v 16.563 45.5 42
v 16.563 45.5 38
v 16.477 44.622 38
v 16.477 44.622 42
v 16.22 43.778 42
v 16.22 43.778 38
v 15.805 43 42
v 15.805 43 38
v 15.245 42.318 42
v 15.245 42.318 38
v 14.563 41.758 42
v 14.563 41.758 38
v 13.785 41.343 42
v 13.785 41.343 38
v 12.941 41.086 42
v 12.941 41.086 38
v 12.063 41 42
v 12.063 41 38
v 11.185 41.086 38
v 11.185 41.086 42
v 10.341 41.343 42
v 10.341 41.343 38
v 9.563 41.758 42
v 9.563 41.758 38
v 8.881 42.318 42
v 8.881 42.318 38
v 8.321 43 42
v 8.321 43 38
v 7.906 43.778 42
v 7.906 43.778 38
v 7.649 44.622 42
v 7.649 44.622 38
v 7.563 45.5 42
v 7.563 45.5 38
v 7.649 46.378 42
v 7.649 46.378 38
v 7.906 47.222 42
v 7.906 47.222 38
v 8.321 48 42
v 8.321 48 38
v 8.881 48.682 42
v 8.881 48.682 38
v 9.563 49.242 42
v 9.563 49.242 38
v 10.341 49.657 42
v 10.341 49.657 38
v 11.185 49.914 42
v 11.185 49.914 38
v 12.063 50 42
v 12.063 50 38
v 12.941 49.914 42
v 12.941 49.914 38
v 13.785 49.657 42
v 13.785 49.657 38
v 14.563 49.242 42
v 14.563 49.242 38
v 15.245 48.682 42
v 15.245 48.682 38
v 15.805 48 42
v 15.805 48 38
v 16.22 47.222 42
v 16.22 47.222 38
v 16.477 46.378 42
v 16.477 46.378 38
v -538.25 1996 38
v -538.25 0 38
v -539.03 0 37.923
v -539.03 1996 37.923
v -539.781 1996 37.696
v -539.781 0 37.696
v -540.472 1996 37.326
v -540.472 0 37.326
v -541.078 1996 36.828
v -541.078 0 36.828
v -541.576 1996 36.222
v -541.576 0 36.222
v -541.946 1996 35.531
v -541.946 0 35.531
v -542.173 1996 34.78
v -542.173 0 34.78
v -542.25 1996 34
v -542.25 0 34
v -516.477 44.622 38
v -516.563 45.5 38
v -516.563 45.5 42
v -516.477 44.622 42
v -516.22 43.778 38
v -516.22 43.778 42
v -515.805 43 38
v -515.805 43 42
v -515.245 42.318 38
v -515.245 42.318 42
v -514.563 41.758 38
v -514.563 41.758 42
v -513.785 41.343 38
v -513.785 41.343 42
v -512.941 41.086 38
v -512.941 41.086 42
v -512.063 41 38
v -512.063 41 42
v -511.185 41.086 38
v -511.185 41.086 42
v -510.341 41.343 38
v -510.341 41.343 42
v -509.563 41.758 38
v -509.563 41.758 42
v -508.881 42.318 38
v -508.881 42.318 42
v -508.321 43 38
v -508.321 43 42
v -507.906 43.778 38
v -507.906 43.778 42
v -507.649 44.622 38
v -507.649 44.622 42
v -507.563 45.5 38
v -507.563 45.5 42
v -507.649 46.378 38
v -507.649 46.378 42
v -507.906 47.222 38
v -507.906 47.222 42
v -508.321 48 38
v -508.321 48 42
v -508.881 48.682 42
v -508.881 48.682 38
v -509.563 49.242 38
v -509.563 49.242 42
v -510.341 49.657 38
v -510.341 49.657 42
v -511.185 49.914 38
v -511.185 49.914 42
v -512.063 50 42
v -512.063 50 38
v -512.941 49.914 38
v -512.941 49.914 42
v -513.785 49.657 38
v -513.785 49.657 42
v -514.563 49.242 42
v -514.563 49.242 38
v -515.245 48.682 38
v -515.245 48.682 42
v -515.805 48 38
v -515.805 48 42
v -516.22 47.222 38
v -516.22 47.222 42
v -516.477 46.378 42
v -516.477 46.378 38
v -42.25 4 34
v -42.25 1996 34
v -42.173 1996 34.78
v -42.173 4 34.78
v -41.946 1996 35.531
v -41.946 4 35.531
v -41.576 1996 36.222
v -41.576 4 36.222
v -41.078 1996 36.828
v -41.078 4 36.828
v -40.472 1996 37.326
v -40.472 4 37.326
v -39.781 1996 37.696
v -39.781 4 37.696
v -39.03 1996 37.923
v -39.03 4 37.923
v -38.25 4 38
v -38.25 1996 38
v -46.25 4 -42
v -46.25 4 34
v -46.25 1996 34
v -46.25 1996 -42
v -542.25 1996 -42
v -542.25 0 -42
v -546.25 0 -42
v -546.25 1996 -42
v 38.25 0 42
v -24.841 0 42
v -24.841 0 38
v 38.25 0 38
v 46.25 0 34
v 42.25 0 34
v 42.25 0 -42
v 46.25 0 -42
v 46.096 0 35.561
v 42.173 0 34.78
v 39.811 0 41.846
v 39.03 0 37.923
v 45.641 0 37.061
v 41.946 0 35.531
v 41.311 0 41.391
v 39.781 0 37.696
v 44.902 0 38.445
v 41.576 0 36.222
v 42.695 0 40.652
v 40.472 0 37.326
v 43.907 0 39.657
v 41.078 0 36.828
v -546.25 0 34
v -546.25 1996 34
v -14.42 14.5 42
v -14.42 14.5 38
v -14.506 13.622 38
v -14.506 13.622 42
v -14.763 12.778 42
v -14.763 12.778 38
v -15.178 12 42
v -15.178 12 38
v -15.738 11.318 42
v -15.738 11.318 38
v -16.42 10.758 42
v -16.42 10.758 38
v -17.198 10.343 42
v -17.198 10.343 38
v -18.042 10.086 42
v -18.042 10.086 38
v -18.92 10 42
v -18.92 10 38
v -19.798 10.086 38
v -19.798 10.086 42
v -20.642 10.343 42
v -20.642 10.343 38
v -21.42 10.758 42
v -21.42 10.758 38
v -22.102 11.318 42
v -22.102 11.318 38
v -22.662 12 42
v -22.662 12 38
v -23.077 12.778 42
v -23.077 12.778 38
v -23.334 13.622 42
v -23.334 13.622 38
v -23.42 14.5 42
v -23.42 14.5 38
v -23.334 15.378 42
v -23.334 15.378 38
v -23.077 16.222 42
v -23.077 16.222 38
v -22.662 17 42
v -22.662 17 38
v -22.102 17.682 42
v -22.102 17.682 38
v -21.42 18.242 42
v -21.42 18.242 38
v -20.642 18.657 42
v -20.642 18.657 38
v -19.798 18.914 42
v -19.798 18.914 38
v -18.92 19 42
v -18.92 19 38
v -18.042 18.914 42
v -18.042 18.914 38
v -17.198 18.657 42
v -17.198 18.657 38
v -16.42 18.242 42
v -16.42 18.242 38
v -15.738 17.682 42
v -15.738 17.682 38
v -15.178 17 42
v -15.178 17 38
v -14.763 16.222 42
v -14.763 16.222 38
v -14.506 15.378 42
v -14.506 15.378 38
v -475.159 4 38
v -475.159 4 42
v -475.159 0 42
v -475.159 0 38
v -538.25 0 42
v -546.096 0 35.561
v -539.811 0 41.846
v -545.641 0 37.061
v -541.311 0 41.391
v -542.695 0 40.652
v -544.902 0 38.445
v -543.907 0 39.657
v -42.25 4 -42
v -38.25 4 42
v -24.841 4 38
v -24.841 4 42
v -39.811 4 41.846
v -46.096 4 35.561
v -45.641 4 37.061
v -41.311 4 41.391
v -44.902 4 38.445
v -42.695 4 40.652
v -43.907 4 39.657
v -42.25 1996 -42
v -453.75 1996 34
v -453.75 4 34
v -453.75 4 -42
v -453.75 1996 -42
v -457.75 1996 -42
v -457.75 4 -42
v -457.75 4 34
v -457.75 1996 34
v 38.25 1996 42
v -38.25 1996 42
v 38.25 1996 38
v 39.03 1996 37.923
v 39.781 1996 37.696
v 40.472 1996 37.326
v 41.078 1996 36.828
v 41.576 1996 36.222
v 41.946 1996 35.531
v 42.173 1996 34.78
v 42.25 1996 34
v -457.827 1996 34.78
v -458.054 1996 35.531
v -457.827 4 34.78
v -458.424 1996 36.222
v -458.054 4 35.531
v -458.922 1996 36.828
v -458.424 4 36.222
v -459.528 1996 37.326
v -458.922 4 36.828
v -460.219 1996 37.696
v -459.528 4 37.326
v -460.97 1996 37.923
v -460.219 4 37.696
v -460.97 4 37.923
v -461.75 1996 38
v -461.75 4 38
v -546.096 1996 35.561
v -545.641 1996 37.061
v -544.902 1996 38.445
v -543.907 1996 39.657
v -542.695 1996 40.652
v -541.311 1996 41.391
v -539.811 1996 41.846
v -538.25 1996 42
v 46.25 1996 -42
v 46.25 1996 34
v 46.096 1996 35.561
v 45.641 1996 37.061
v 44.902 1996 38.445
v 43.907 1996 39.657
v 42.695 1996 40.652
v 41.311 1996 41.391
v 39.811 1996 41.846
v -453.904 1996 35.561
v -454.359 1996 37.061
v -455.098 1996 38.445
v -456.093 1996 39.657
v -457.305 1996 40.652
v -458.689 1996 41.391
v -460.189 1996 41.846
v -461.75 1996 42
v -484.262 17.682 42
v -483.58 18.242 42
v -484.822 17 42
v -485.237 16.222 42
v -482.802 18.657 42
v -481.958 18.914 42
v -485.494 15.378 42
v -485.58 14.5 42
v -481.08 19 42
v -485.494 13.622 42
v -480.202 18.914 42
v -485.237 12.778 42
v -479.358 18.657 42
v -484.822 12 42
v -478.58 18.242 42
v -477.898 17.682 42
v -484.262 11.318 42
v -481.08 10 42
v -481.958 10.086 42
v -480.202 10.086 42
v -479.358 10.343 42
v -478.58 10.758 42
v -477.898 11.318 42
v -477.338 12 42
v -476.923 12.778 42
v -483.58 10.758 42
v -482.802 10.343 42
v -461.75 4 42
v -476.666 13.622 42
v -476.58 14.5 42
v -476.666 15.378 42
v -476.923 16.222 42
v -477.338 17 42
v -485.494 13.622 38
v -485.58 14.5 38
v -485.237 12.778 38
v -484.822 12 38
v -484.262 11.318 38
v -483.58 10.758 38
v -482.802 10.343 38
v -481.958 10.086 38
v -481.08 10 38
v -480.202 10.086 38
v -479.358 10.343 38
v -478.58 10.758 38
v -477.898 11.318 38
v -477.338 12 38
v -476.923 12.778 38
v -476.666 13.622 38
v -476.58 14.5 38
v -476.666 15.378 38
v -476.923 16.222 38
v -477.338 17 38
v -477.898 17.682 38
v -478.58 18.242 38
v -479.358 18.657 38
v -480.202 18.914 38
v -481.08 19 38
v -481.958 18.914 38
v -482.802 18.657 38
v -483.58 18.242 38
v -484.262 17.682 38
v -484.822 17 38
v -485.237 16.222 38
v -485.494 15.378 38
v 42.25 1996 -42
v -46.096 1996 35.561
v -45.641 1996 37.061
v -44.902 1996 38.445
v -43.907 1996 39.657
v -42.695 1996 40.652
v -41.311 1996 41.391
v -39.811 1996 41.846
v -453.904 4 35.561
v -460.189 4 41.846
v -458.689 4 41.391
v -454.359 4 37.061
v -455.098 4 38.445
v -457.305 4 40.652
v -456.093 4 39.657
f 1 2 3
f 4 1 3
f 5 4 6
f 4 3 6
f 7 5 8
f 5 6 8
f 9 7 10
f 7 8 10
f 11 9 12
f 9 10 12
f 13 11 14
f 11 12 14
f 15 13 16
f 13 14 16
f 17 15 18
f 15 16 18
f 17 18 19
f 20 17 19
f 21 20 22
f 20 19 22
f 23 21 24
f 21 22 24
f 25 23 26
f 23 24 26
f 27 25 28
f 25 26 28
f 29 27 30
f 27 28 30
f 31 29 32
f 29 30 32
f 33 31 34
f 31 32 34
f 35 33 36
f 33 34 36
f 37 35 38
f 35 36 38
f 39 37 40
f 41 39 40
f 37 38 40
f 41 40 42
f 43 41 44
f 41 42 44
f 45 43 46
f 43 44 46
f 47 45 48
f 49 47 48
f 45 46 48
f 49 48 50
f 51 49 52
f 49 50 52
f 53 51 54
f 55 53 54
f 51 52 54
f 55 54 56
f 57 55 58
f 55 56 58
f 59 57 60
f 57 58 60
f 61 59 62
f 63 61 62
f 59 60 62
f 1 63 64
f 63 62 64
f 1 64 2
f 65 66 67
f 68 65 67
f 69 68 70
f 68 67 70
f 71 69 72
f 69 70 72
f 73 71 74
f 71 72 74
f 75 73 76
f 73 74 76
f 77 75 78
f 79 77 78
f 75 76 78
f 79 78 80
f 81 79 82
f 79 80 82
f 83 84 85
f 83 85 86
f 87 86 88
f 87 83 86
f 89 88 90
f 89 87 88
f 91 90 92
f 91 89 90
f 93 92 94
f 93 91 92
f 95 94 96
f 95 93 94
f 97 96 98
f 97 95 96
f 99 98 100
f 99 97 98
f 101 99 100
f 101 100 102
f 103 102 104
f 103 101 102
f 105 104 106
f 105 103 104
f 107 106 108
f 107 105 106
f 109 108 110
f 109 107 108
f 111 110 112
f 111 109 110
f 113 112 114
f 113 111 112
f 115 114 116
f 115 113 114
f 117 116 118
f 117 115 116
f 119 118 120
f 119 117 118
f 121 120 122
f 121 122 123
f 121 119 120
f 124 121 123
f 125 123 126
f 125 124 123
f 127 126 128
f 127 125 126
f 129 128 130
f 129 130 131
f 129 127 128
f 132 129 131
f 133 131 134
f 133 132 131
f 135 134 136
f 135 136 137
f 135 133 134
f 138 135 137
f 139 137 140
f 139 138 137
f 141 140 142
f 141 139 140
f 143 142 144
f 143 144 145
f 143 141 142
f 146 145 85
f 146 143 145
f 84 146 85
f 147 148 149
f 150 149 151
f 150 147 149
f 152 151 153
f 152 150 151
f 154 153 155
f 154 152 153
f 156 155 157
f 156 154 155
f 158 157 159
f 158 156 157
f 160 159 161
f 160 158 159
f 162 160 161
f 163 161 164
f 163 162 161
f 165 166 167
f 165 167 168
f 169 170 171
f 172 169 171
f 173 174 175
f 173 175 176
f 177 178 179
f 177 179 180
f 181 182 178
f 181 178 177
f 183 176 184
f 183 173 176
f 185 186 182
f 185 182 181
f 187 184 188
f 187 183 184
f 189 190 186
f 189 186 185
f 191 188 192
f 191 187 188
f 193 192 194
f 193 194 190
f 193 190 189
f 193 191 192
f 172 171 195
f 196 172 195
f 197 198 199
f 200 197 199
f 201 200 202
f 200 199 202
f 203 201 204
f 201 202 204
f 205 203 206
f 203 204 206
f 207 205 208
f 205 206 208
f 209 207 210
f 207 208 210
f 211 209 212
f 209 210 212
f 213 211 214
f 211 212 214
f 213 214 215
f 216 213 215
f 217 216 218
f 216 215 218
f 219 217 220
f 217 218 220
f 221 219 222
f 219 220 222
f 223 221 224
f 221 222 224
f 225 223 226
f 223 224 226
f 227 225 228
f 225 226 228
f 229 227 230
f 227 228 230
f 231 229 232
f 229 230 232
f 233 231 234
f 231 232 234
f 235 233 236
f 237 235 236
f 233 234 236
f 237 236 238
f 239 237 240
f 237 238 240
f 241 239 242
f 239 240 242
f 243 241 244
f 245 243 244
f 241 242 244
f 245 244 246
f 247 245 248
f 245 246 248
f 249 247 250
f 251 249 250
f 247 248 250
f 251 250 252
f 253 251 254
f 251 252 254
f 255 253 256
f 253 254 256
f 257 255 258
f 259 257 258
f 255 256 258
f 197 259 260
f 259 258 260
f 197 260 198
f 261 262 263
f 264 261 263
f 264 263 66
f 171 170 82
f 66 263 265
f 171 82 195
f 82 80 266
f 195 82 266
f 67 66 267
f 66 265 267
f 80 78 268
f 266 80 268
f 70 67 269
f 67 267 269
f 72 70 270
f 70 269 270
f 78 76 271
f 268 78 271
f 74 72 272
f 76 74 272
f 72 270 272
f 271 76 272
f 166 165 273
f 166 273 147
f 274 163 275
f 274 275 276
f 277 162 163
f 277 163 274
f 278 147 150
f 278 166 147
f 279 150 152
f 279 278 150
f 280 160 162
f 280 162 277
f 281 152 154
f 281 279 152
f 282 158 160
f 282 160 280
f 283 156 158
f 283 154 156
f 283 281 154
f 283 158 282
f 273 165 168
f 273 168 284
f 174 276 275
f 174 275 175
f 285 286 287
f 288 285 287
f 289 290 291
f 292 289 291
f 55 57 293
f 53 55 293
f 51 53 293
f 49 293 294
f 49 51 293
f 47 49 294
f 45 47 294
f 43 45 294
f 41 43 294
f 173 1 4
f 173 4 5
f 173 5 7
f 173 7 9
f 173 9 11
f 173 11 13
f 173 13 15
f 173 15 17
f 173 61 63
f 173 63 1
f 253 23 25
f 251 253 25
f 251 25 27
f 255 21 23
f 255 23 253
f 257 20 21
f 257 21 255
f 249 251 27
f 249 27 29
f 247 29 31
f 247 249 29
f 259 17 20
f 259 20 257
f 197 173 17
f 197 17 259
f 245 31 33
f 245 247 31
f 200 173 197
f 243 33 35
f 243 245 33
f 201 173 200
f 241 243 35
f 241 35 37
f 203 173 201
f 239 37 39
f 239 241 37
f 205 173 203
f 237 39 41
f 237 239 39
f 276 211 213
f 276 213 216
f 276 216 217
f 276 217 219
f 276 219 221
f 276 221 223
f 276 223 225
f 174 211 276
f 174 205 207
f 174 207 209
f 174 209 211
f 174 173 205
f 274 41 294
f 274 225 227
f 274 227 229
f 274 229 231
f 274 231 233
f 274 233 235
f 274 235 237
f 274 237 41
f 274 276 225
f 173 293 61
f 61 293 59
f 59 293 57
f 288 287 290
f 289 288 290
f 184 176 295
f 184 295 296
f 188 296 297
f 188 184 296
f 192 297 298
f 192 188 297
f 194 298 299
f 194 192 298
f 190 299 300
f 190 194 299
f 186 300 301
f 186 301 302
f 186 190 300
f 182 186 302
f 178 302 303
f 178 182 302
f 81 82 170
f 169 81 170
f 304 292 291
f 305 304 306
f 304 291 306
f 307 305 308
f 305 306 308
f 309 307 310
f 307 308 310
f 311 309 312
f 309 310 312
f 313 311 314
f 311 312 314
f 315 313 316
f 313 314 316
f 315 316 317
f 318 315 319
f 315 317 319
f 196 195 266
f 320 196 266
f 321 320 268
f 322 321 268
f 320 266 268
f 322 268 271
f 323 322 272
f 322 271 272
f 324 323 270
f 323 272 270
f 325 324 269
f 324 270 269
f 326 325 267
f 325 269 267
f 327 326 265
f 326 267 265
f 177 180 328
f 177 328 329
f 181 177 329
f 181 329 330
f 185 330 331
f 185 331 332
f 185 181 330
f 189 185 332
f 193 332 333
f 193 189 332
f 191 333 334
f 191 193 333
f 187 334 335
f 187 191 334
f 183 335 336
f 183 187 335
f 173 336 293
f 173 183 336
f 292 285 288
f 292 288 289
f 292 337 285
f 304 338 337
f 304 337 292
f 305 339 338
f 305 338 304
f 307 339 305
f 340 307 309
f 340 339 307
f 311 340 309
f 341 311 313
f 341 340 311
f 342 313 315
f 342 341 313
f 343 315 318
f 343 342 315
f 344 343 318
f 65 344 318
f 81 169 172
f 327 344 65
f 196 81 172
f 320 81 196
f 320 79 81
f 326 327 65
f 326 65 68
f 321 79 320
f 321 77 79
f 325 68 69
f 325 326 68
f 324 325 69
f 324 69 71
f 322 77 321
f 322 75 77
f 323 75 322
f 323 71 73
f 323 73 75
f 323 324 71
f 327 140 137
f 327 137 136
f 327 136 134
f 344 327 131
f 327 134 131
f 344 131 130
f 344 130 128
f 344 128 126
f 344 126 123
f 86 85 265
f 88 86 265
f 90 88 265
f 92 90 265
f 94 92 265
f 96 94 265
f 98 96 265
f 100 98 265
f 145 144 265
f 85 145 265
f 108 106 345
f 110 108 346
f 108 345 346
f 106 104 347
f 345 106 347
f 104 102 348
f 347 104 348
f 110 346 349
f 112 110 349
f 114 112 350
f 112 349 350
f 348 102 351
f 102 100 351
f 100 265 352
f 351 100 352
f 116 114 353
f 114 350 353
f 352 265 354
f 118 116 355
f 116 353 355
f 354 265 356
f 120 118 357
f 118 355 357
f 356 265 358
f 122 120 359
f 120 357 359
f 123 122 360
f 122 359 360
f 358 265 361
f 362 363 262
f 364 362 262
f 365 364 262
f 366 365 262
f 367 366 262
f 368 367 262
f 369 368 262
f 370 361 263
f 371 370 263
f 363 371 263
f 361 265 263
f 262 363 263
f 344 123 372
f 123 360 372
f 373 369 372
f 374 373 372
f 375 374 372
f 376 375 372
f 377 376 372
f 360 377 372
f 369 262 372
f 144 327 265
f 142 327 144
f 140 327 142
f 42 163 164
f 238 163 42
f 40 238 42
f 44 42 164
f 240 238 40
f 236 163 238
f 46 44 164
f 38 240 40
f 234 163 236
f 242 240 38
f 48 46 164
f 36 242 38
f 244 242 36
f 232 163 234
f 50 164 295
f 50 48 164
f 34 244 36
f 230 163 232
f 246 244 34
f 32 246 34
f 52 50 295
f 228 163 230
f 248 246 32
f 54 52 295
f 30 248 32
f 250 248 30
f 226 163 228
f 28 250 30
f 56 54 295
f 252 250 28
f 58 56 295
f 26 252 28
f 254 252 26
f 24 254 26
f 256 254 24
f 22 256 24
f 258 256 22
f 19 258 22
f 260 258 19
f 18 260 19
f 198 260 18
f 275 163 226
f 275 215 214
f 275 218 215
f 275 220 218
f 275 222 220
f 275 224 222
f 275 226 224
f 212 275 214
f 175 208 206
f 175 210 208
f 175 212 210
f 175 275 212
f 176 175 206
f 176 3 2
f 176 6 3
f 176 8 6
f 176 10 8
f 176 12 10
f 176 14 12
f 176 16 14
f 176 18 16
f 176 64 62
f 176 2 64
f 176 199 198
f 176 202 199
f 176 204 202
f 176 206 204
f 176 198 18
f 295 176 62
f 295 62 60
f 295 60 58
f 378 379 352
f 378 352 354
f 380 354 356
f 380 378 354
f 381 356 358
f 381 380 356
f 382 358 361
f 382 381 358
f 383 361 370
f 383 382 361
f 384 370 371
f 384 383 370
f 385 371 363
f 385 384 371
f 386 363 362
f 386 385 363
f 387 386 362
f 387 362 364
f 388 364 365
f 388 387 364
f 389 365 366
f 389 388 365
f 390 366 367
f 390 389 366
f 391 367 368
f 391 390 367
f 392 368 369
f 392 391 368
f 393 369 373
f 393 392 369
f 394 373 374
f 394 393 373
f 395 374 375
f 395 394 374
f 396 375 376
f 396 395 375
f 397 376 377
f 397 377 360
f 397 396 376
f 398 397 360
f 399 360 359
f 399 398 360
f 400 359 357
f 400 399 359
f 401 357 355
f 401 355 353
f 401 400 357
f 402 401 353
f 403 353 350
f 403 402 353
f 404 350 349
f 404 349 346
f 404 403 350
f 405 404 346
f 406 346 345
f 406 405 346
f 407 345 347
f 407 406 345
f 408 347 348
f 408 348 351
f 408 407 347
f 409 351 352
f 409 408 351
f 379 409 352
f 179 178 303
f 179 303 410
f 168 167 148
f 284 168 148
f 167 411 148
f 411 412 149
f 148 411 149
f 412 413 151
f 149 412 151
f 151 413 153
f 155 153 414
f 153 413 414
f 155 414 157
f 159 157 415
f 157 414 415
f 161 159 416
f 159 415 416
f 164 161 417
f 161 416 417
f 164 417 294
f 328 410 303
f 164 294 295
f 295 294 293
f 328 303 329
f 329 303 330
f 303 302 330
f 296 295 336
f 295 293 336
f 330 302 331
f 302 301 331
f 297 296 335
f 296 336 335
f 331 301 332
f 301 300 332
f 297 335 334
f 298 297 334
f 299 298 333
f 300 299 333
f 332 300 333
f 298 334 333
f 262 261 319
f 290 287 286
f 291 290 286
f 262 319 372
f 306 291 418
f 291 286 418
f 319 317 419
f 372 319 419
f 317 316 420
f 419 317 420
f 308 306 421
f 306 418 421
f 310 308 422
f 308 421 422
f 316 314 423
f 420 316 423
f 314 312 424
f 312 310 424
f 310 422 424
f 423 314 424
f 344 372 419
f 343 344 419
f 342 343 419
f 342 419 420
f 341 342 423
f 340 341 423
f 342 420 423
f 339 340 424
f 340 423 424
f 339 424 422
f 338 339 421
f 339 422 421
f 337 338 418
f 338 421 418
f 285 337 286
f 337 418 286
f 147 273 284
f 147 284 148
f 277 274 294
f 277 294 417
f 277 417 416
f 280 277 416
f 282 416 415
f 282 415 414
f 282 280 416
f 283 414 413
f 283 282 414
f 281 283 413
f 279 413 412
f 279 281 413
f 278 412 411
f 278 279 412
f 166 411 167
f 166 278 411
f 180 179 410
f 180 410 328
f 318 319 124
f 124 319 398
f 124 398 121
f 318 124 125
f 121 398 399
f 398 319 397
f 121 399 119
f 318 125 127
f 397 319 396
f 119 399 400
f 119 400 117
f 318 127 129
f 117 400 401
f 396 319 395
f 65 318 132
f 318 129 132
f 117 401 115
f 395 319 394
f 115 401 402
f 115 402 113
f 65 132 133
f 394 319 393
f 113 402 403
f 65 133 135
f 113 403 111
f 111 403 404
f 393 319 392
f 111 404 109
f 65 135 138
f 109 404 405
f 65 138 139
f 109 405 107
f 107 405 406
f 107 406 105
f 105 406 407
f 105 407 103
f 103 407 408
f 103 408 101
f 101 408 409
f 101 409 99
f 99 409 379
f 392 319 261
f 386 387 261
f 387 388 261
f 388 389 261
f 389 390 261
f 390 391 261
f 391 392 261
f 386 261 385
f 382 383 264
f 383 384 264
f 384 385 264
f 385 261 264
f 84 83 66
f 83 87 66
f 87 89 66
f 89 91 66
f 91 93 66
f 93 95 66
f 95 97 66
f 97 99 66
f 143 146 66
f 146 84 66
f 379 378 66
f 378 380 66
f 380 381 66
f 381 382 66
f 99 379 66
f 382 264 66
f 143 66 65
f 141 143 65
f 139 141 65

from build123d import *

# Parameters (mm, degrees)
F1_DEPTH = 1996
F3_W     = 4
F3_H     = 87
F4_DEPTH = 21.409
F6_R     = 4.5
F5_R     = 4.5
F7_DEPTH = 4


with BuildPart() as f1:
    # F0 (on Front) → F1 (new body)
    with BuildSketch(Plane.XZ):
        with BuildLine():
            Line((-46.25, 34), (-46.25, -42))
            Line((-46.25, -42), (-42.25, -42))
            Line((-42.25, -42), (-42.25, 34))
            ThreePointArc((-42.25, 34), (-41.078427, 36.828427), (-38.25, 38))
            Line((-38.25, 38), (38.25, 38))
            ThreePointArc((38.25, 38), (41.078427, 36.828427), (42.25, 34))
            Line((42.25, 34), (42.25, -42))
            Line((42.25, -42), (46.25, -42))
            Line((46.25, -42), (46.25, 34))
            ThreePointArc((46.25, 34), (43.906854, 39.656854), (38.25, 42))
            Line((38.25, 42), (-38.25, 42))
            ThreePointArc((-38.25, 42), (-43.906854, 39.656854), (-46.25, 34))
        make_face()
    extrude(amount=-F1_DEPTH)

    # F3 (on face) → F4 (cut)
    with BuildSketch(Plane(origin=(-46.25, 0, 0), x_dir=(0, -1, 0), z_dir=(-1, 0, 0))):
        with Locations((-2, 0.370724)):
            Rectangle(F3_W, F3_H)
    extrude(amount=-F4_DEPTH, mode=Mode.SUBTRACT)

    # F6 (on face) + F5 (on face) → F7 (cut)
    with BuildSketch(Plane(origin=(0, 0, 38), x_dir=(1, 0, 0), z_dir=(0, 0, -1))):
        with Locations((12.063, -45.5)):
            Circle(F6_R)
    with BuildSketch(Plane(origin=(0, 0, 38), x_dir=(1, 0, 0), z_dir=(0, 0, -1))):
        with Locations((-18.92, -14.5)):
            Circle(F5_R)
    extrude(amount=-F7_DEPTH, mode=Mode.SUBTRACT)


with BuildPart() as f9_1:
    # F9: instance of F1
    add(f1.part.mirror(Plane.YZ.offset(-250)))


solid = Compound([f1.part, f9_1.part])
